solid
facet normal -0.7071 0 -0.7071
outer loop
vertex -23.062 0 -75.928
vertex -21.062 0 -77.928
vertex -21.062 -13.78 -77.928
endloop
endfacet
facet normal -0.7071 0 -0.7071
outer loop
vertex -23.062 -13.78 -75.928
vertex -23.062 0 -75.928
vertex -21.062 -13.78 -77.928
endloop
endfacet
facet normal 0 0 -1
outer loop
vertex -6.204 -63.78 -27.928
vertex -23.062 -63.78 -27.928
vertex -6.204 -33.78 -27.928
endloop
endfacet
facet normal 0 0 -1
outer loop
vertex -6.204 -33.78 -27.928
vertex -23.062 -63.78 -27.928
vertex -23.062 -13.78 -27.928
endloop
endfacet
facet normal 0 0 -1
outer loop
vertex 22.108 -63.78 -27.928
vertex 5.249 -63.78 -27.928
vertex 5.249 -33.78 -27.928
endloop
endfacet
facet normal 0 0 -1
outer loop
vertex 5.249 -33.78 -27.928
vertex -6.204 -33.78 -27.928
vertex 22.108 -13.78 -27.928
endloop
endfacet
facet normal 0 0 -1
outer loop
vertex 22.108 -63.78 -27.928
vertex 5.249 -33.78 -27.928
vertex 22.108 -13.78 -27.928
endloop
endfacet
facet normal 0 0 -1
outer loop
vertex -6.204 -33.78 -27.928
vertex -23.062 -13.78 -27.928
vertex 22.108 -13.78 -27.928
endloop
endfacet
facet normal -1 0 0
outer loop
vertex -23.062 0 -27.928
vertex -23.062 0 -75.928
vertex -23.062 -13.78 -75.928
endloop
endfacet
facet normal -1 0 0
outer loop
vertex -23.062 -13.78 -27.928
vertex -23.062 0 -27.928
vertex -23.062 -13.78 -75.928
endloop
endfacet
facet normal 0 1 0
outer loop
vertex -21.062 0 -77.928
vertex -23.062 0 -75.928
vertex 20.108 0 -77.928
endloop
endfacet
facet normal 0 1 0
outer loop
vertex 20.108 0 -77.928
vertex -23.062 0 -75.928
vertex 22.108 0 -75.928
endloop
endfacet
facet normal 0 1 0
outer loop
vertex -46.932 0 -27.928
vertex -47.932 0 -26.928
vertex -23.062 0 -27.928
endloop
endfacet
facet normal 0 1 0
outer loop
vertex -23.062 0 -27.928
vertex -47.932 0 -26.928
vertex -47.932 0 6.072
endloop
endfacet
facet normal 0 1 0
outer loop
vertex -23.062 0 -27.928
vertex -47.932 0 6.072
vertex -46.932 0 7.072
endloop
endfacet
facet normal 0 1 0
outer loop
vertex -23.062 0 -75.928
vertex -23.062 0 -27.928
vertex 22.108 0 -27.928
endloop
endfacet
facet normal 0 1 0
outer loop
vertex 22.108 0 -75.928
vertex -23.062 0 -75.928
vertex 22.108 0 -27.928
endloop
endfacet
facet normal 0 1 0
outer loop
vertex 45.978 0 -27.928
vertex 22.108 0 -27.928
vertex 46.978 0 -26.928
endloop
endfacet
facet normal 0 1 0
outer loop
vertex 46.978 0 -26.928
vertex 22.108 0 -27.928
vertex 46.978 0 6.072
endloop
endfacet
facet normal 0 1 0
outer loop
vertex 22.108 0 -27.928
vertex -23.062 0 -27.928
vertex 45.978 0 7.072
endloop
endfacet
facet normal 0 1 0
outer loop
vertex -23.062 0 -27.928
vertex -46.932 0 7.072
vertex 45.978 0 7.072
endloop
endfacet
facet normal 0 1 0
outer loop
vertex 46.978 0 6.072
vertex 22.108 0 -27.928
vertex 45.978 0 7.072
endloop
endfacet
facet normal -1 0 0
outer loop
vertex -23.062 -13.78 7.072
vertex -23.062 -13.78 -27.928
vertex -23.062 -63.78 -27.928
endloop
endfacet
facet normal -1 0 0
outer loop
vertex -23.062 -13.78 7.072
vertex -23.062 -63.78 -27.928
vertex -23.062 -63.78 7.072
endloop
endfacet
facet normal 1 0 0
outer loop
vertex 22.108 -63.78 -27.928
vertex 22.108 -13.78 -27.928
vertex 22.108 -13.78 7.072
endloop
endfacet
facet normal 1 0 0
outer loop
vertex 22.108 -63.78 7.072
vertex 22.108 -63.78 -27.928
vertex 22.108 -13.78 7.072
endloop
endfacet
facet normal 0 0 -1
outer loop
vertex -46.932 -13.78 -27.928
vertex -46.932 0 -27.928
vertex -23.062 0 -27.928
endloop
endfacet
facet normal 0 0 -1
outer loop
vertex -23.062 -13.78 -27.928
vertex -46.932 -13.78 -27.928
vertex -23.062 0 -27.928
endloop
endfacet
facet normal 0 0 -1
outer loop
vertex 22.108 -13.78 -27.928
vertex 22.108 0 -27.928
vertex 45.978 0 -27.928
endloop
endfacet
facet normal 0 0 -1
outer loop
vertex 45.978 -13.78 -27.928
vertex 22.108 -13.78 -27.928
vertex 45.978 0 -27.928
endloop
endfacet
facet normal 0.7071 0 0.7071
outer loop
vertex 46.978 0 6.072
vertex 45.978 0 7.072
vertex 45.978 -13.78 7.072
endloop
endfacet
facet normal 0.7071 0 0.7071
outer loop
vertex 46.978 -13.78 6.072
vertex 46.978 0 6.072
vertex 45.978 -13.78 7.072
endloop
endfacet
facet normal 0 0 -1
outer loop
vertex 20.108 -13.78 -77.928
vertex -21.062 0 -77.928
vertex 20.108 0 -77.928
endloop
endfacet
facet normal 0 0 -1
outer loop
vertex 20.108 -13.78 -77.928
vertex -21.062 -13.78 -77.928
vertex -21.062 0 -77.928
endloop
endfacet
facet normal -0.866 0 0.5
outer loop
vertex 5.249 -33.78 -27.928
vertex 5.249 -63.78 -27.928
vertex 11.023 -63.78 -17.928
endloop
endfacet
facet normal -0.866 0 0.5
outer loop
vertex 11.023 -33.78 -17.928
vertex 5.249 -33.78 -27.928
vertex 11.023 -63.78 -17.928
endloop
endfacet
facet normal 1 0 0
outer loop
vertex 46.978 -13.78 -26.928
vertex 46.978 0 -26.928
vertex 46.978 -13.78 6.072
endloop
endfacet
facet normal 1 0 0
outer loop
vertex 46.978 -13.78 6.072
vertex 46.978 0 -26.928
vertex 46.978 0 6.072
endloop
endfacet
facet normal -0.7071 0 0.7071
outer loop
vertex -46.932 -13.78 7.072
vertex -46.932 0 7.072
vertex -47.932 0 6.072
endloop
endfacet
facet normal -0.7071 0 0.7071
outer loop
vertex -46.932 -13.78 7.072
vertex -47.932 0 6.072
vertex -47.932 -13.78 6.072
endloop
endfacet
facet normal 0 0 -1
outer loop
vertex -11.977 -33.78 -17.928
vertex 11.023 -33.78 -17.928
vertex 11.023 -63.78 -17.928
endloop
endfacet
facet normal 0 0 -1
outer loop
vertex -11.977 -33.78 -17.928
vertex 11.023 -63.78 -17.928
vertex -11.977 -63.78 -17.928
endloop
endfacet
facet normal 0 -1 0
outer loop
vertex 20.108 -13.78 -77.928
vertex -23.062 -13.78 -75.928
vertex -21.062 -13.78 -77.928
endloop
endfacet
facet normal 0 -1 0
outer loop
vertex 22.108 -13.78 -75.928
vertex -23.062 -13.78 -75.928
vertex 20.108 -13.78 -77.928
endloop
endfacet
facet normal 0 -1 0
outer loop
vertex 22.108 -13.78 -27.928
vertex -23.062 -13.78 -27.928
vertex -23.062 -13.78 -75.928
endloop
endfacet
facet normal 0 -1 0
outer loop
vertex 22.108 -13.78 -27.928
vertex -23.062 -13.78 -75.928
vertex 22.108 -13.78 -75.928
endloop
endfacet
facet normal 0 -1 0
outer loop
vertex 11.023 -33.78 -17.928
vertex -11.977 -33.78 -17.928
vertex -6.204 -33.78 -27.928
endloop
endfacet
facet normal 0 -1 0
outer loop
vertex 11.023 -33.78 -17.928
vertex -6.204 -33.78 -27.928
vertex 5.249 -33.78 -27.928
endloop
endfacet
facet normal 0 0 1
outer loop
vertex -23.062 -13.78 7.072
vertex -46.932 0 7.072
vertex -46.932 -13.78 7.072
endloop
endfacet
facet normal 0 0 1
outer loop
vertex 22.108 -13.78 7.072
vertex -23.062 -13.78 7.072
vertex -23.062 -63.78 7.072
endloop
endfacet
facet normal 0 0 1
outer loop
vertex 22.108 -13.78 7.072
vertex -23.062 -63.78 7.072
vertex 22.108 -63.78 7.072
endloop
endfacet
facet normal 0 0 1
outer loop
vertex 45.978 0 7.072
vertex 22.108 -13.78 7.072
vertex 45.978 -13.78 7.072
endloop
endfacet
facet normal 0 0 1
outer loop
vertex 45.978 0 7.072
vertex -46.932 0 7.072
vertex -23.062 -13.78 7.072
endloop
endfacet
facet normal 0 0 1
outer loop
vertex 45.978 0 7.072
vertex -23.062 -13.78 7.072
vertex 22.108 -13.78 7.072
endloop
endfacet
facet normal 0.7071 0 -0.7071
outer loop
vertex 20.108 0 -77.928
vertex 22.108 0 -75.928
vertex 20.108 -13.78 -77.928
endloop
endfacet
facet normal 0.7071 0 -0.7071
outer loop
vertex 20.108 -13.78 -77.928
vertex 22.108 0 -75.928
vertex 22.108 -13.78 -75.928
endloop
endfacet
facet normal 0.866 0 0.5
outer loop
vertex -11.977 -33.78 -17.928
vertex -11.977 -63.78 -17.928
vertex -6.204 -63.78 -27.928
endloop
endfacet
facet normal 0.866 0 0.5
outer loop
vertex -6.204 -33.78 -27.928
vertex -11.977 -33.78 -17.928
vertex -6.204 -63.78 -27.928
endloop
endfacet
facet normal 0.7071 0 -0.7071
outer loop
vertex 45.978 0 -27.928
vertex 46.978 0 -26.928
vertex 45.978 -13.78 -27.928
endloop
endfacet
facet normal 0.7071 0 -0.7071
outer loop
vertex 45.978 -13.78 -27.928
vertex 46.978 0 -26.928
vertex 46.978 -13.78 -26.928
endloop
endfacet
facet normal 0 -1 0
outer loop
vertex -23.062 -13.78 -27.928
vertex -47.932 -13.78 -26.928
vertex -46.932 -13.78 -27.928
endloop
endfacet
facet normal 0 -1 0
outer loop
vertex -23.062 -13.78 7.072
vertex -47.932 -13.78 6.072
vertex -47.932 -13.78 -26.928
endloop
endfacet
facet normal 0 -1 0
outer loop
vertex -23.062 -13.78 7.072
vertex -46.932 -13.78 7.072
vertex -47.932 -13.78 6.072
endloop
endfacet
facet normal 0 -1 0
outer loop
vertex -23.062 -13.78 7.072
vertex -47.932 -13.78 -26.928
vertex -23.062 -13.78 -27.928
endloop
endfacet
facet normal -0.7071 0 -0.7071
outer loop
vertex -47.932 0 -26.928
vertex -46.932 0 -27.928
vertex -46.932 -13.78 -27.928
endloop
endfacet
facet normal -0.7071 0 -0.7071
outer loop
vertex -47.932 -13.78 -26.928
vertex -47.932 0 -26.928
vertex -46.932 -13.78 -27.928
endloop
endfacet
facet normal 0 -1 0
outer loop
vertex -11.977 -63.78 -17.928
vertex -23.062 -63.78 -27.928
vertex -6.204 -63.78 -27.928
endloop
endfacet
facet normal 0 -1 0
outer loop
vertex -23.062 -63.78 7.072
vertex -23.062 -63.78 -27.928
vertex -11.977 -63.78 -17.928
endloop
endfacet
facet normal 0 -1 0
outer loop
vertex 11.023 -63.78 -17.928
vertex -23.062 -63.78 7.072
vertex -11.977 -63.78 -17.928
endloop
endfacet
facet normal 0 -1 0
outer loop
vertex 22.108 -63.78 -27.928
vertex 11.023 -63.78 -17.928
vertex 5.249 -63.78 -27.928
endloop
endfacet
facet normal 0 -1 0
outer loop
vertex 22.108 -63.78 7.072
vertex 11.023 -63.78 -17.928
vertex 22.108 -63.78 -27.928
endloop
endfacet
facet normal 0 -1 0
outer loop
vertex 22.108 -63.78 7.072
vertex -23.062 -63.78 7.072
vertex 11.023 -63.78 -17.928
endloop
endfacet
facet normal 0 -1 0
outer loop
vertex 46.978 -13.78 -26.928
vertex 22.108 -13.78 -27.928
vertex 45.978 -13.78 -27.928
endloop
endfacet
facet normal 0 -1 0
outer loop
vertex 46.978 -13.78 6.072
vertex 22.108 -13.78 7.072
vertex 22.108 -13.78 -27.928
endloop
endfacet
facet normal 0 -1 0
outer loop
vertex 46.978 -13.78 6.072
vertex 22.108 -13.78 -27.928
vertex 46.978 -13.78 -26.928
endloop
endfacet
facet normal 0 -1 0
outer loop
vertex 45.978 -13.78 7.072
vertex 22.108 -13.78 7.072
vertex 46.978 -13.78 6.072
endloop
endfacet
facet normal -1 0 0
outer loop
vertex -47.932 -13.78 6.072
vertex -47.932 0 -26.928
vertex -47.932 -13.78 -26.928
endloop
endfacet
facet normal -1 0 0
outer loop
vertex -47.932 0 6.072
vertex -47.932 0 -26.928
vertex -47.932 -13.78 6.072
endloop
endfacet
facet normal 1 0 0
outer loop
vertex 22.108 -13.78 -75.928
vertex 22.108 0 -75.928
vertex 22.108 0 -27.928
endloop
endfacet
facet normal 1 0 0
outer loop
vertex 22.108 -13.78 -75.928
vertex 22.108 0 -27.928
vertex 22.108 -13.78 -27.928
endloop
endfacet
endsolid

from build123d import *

# Parameters (mm, degrees)
F0_W     = 94.91
F0_H     = 35
F1_DEPTH = 13.78
F2_SIZE  = 1
F3_W     = 45.17
F3_H     = 35
F4_DEPTH = 50
F5_W     = 45.17
F5_H     = 13.78
F6_DEPTH = 50
F8_DEPTH = 30
F9_SIZE  = 2


with BuildPart() as f1:
    # F0 (on Front) → F1 (new body)
    with BuildSketch(Plane.XZ):
        with Locations((-0.477387, -10.428106)):
            Rectangle(F0_W, F0_H)
    extrude(amount=F1_DEPTH)

    # F2
    f2_edges = [f1.edges().sort_by_distance(p)[0] for p in [
        (-47.932387, -6.89, -27.928106),
        (46.977613, -6.89, -27.928106),
        (46.977613, -6.89, 7.071894),
        (-47.932387, -6.89, 7.071894),
    ]]
    chamfer(f2_edges, length=F2_SIZE)

    # F3 (on face) → F4 (join)
    with BuildSketch(Plane.XZ.offset(13.78)):
        with Locations((-0.477387, -10.428106)):
            Rectangle(F3_W, F3_H)
    extrude(amount=F4_DEPTH)

    # F5 (on face) → F6 (join)
    with BuildSketch(Plane(origin=(0, 0, -27.928106), x_dir=(1, 0, 0), z_dir=(0, 0, -1))):
        with Locations((-0.477387, 6.89)):
            Rectangle(F5_W, F5_H)
    extrude(amount=F6_DEPTH)

    # F7 (on face) → F8 (cut)
    with BuildSketch(Plane.XZ.offset(63.78)):
        Polygon((11.022613, -17.928106), (-11.977387, -17.928106), (-6.203884, -27.928106), (5.249111, -27.928106), align=None)
    extrude(amount=-F8_DEPTH, mode=Mode.SUBTRACT)

    # F9
    f9_edges = [f1.edges().sort_by_distance(p)[0] for p in [
        (-23.062387, -6.89, -77.928106),
        (22.107613, -6.89, -77.928106),
    ]]
    chamfer(f9_edges, length=F9_SIZE)


solid = f1.part
